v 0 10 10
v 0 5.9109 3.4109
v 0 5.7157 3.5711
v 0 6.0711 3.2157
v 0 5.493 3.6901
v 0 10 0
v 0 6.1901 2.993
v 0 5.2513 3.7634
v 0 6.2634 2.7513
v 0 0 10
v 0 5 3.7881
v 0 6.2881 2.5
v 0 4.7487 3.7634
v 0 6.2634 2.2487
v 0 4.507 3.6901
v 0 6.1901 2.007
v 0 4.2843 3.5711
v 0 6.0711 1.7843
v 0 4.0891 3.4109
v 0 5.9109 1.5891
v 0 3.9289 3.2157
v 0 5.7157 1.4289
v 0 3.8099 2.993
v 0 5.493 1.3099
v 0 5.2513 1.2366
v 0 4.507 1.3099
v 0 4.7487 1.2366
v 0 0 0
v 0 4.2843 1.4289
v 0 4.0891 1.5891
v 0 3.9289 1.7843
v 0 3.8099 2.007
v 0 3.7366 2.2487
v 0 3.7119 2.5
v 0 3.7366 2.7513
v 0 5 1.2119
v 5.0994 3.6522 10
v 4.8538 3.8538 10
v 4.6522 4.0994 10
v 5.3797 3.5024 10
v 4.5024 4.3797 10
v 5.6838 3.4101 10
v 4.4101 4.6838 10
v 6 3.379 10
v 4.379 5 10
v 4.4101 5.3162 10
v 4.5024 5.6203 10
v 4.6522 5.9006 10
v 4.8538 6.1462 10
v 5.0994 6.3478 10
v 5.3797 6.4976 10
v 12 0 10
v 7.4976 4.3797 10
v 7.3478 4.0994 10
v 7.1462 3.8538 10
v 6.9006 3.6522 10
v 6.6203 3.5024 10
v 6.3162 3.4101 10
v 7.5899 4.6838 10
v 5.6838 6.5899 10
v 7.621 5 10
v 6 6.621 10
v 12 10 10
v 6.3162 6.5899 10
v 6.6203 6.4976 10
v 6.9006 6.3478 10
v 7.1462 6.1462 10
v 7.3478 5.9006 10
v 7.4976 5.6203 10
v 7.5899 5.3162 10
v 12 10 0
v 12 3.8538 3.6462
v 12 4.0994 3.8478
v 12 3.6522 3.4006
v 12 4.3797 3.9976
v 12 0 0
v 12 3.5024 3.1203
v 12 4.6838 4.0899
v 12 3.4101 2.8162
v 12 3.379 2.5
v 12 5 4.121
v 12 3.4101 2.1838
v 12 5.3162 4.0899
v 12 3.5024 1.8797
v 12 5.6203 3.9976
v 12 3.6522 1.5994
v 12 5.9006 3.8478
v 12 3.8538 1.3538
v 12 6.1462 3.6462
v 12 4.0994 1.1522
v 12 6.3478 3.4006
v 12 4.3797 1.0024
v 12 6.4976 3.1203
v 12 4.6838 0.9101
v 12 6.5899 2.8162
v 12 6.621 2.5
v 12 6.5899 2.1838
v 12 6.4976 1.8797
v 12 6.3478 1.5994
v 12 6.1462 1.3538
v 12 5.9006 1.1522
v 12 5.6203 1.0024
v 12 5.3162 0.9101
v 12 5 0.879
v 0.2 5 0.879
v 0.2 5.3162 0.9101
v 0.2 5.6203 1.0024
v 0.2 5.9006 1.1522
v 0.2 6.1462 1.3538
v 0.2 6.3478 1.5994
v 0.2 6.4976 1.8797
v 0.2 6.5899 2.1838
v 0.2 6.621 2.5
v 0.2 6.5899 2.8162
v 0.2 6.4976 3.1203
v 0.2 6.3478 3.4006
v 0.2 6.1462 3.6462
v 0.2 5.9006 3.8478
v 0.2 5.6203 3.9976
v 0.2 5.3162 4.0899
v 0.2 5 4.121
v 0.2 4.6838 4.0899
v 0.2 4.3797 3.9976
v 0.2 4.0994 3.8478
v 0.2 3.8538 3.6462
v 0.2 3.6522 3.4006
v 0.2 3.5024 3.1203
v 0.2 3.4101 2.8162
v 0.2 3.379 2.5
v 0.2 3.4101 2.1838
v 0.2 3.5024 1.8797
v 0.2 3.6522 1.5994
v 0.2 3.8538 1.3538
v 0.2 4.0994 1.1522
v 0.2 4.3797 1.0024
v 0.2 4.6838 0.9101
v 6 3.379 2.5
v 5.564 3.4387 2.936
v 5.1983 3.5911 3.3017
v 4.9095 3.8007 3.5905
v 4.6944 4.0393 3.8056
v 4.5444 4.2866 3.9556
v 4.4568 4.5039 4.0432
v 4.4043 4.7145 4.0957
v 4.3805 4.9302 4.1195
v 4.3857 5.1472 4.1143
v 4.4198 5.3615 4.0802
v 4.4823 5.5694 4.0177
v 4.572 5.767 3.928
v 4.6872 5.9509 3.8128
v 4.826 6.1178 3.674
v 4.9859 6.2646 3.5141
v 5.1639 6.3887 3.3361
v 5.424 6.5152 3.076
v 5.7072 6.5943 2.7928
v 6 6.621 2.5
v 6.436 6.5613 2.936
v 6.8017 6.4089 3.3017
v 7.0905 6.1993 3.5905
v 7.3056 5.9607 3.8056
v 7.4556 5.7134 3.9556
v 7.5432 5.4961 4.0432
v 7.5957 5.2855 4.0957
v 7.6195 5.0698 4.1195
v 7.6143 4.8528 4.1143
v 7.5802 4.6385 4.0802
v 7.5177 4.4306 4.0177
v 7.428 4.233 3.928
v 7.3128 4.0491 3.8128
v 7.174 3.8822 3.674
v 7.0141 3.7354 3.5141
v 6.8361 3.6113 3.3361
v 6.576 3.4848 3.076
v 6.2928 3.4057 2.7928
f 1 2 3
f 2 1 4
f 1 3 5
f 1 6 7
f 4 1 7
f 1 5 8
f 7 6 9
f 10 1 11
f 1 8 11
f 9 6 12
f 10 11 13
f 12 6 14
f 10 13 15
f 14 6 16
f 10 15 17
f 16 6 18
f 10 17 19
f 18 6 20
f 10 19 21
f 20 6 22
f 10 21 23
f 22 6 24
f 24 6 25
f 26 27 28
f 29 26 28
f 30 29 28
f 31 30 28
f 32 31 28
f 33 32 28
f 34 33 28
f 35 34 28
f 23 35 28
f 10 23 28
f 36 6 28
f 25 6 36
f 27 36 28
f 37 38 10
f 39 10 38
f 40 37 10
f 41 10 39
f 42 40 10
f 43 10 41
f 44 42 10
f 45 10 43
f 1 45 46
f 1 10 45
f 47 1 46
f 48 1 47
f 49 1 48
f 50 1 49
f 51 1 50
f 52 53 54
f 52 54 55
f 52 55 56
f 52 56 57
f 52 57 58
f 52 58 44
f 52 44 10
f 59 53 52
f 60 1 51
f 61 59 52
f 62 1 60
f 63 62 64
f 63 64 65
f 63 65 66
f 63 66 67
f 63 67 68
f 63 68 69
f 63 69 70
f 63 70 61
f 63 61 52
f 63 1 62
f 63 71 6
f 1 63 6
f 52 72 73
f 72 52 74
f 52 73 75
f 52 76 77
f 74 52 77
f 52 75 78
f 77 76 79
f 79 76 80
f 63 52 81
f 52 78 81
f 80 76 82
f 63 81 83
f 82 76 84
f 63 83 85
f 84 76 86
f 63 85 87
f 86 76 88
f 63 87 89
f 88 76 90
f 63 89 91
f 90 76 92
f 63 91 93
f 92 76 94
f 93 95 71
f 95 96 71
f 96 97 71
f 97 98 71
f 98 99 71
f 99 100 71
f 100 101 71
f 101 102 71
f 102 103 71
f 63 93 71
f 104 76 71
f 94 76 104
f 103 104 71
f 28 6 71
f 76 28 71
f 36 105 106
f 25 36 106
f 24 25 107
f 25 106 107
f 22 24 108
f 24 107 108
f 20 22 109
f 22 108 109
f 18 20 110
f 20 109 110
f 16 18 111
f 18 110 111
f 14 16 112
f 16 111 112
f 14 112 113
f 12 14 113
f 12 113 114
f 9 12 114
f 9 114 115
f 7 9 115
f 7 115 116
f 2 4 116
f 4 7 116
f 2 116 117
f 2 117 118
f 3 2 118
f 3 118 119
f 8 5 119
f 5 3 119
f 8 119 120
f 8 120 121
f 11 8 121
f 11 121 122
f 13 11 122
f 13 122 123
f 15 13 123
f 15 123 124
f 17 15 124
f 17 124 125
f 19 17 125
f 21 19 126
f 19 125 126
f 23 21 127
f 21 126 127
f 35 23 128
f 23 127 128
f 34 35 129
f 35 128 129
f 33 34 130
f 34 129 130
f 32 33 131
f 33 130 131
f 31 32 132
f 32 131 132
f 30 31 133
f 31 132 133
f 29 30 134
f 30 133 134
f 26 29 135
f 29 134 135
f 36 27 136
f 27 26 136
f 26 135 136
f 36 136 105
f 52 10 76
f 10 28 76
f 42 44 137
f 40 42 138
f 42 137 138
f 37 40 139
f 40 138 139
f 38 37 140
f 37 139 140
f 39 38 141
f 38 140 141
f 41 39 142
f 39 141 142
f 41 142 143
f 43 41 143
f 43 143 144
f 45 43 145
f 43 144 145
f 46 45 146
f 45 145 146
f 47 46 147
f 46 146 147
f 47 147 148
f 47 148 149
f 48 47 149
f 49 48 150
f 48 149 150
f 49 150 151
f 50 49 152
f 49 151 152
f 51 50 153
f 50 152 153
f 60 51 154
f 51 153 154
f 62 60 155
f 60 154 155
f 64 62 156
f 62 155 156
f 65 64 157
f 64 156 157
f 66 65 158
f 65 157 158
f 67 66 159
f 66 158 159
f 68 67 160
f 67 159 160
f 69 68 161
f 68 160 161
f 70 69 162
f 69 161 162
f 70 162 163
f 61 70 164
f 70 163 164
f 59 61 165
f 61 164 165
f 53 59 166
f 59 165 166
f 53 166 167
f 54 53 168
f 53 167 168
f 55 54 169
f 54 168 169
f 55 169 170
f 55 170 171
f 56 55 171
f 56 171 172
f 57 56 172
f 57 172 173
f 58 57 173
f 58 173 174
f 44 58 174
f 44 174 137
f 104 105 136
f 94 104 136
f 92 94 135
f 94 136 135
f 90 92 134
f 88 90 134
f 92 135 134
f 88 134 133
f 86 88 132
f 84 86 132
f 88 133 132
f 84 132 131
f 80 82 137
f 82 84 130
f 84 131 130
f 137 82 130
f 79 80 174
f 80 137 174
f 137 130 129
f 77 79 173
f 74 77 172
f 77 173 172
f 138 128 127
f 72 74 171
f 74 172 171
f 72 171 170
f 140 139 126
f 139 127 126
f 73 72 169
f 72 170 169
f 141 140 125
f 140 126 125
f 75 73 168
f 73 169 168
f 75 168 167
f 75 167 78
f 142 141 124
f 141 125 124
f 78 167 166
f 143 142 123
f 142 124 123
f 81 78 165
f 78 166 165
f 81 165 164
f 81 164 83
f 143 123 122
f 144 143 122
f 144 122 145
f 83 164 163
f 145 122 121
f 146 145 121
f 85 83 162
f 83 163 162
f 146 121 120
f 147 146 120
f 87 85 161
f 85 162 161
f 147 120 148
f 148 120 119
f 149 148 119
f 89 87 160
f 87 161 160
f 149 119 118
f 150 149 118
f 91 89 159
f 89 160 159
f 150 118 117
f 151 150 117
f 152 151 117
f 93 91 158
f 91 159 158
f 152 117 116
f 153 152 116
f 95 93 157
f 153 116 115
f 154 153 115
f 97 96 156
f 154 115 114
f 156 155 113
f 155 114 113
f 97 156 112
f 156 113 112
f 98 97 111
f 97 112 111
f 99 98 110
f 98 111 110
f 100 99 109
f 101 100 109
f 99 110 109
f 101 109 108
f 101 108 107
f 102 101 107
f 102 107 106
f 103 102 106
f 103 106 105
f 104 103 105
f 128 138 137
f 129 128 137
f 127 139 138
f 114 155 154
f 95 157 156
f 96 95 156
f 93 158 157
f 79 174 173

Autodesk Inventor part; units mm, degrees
ref_plane "YZ Plane" through (0, 0, 0) normal (1, 0, 0) x (0, 1, 0)
ref_plane "XZ Plane" through (0, 0, 0) normal (0, 1, 0) x (-1, 0, 0)
ref_plane "XY Plane" through (0, 0, 0) normal (0, 0, 1) x (1, 0, 0)
sketch "Skizze1" plane through (0, 0, 0) normal (0, 0, 1) x (1, 0, 0)
  line L0 (0, 0) -> (12, 0)
  line L1 (12, 0) -> (12, 10)
  line L2 (12, 10) -> (0, 10)
  line L3 (0, 10) -> (0, 0)
  dimension "d0" = 10
  dimension "d1" = 12
extrude "Extrusion1" add sketch "Skizze1" along normal blind 10
sketch "Skizze2" plane through (12, 0, 0) normal (1, 0, 0) x (0, 0, -1)
  line L0 (0, 0) -> (0, 10) projected
  line L1 (0, 10) -> (-10, 10) projected
  line L2 (-10, 0) -> (-10, 10) projected
  line L3 (0, 0) -> (-10, 0) projected
  line L4 (-10, 5) -> (0, 5) construction
  point P0 (-2.5, 5)
  dimension "d4" = 2.5
hole "Bohrung1" at (12, 5, 2.5) direction (-1, 0, 0) diameter 3.242 depth 11.8 tip angle 118 thread size "M4x0.7" class "6H" standard "ISO Metric profile"
sketch "Skizze3" plane through (0, 0, 10) normal (0, 0, 1) x (1, 0, 0)
  line L0 (0, 0) -> (12, 0) projected
  line L1 (12, 0) -> (12, 10) projected
  line L2 (12, 10) -> (0, 10) projected
  line L3 (0, 10) -> (0, 0) projected
  line L4 (12, 6.621) -> (12, 3.379) projected
  line L5 (0.2, 3.379) -> (0.2, 6.621) projected
  line L6 (-2.4, 5) -> (14.4, 5) projected
  line L7 (6, 0) -> (6, 10) construction
  point P0 (6, 5)
  point P1 (6, 5)
hole "Bohrung2" at (6, 5, 10) direction (0, 0, -1) diameter 3.242 end up to surface thread size "M4x0.7" class "6H" standard "ISO Metric profile"
properties part number "Alu_Belt_tens_3" material "Aluminium 6061"
